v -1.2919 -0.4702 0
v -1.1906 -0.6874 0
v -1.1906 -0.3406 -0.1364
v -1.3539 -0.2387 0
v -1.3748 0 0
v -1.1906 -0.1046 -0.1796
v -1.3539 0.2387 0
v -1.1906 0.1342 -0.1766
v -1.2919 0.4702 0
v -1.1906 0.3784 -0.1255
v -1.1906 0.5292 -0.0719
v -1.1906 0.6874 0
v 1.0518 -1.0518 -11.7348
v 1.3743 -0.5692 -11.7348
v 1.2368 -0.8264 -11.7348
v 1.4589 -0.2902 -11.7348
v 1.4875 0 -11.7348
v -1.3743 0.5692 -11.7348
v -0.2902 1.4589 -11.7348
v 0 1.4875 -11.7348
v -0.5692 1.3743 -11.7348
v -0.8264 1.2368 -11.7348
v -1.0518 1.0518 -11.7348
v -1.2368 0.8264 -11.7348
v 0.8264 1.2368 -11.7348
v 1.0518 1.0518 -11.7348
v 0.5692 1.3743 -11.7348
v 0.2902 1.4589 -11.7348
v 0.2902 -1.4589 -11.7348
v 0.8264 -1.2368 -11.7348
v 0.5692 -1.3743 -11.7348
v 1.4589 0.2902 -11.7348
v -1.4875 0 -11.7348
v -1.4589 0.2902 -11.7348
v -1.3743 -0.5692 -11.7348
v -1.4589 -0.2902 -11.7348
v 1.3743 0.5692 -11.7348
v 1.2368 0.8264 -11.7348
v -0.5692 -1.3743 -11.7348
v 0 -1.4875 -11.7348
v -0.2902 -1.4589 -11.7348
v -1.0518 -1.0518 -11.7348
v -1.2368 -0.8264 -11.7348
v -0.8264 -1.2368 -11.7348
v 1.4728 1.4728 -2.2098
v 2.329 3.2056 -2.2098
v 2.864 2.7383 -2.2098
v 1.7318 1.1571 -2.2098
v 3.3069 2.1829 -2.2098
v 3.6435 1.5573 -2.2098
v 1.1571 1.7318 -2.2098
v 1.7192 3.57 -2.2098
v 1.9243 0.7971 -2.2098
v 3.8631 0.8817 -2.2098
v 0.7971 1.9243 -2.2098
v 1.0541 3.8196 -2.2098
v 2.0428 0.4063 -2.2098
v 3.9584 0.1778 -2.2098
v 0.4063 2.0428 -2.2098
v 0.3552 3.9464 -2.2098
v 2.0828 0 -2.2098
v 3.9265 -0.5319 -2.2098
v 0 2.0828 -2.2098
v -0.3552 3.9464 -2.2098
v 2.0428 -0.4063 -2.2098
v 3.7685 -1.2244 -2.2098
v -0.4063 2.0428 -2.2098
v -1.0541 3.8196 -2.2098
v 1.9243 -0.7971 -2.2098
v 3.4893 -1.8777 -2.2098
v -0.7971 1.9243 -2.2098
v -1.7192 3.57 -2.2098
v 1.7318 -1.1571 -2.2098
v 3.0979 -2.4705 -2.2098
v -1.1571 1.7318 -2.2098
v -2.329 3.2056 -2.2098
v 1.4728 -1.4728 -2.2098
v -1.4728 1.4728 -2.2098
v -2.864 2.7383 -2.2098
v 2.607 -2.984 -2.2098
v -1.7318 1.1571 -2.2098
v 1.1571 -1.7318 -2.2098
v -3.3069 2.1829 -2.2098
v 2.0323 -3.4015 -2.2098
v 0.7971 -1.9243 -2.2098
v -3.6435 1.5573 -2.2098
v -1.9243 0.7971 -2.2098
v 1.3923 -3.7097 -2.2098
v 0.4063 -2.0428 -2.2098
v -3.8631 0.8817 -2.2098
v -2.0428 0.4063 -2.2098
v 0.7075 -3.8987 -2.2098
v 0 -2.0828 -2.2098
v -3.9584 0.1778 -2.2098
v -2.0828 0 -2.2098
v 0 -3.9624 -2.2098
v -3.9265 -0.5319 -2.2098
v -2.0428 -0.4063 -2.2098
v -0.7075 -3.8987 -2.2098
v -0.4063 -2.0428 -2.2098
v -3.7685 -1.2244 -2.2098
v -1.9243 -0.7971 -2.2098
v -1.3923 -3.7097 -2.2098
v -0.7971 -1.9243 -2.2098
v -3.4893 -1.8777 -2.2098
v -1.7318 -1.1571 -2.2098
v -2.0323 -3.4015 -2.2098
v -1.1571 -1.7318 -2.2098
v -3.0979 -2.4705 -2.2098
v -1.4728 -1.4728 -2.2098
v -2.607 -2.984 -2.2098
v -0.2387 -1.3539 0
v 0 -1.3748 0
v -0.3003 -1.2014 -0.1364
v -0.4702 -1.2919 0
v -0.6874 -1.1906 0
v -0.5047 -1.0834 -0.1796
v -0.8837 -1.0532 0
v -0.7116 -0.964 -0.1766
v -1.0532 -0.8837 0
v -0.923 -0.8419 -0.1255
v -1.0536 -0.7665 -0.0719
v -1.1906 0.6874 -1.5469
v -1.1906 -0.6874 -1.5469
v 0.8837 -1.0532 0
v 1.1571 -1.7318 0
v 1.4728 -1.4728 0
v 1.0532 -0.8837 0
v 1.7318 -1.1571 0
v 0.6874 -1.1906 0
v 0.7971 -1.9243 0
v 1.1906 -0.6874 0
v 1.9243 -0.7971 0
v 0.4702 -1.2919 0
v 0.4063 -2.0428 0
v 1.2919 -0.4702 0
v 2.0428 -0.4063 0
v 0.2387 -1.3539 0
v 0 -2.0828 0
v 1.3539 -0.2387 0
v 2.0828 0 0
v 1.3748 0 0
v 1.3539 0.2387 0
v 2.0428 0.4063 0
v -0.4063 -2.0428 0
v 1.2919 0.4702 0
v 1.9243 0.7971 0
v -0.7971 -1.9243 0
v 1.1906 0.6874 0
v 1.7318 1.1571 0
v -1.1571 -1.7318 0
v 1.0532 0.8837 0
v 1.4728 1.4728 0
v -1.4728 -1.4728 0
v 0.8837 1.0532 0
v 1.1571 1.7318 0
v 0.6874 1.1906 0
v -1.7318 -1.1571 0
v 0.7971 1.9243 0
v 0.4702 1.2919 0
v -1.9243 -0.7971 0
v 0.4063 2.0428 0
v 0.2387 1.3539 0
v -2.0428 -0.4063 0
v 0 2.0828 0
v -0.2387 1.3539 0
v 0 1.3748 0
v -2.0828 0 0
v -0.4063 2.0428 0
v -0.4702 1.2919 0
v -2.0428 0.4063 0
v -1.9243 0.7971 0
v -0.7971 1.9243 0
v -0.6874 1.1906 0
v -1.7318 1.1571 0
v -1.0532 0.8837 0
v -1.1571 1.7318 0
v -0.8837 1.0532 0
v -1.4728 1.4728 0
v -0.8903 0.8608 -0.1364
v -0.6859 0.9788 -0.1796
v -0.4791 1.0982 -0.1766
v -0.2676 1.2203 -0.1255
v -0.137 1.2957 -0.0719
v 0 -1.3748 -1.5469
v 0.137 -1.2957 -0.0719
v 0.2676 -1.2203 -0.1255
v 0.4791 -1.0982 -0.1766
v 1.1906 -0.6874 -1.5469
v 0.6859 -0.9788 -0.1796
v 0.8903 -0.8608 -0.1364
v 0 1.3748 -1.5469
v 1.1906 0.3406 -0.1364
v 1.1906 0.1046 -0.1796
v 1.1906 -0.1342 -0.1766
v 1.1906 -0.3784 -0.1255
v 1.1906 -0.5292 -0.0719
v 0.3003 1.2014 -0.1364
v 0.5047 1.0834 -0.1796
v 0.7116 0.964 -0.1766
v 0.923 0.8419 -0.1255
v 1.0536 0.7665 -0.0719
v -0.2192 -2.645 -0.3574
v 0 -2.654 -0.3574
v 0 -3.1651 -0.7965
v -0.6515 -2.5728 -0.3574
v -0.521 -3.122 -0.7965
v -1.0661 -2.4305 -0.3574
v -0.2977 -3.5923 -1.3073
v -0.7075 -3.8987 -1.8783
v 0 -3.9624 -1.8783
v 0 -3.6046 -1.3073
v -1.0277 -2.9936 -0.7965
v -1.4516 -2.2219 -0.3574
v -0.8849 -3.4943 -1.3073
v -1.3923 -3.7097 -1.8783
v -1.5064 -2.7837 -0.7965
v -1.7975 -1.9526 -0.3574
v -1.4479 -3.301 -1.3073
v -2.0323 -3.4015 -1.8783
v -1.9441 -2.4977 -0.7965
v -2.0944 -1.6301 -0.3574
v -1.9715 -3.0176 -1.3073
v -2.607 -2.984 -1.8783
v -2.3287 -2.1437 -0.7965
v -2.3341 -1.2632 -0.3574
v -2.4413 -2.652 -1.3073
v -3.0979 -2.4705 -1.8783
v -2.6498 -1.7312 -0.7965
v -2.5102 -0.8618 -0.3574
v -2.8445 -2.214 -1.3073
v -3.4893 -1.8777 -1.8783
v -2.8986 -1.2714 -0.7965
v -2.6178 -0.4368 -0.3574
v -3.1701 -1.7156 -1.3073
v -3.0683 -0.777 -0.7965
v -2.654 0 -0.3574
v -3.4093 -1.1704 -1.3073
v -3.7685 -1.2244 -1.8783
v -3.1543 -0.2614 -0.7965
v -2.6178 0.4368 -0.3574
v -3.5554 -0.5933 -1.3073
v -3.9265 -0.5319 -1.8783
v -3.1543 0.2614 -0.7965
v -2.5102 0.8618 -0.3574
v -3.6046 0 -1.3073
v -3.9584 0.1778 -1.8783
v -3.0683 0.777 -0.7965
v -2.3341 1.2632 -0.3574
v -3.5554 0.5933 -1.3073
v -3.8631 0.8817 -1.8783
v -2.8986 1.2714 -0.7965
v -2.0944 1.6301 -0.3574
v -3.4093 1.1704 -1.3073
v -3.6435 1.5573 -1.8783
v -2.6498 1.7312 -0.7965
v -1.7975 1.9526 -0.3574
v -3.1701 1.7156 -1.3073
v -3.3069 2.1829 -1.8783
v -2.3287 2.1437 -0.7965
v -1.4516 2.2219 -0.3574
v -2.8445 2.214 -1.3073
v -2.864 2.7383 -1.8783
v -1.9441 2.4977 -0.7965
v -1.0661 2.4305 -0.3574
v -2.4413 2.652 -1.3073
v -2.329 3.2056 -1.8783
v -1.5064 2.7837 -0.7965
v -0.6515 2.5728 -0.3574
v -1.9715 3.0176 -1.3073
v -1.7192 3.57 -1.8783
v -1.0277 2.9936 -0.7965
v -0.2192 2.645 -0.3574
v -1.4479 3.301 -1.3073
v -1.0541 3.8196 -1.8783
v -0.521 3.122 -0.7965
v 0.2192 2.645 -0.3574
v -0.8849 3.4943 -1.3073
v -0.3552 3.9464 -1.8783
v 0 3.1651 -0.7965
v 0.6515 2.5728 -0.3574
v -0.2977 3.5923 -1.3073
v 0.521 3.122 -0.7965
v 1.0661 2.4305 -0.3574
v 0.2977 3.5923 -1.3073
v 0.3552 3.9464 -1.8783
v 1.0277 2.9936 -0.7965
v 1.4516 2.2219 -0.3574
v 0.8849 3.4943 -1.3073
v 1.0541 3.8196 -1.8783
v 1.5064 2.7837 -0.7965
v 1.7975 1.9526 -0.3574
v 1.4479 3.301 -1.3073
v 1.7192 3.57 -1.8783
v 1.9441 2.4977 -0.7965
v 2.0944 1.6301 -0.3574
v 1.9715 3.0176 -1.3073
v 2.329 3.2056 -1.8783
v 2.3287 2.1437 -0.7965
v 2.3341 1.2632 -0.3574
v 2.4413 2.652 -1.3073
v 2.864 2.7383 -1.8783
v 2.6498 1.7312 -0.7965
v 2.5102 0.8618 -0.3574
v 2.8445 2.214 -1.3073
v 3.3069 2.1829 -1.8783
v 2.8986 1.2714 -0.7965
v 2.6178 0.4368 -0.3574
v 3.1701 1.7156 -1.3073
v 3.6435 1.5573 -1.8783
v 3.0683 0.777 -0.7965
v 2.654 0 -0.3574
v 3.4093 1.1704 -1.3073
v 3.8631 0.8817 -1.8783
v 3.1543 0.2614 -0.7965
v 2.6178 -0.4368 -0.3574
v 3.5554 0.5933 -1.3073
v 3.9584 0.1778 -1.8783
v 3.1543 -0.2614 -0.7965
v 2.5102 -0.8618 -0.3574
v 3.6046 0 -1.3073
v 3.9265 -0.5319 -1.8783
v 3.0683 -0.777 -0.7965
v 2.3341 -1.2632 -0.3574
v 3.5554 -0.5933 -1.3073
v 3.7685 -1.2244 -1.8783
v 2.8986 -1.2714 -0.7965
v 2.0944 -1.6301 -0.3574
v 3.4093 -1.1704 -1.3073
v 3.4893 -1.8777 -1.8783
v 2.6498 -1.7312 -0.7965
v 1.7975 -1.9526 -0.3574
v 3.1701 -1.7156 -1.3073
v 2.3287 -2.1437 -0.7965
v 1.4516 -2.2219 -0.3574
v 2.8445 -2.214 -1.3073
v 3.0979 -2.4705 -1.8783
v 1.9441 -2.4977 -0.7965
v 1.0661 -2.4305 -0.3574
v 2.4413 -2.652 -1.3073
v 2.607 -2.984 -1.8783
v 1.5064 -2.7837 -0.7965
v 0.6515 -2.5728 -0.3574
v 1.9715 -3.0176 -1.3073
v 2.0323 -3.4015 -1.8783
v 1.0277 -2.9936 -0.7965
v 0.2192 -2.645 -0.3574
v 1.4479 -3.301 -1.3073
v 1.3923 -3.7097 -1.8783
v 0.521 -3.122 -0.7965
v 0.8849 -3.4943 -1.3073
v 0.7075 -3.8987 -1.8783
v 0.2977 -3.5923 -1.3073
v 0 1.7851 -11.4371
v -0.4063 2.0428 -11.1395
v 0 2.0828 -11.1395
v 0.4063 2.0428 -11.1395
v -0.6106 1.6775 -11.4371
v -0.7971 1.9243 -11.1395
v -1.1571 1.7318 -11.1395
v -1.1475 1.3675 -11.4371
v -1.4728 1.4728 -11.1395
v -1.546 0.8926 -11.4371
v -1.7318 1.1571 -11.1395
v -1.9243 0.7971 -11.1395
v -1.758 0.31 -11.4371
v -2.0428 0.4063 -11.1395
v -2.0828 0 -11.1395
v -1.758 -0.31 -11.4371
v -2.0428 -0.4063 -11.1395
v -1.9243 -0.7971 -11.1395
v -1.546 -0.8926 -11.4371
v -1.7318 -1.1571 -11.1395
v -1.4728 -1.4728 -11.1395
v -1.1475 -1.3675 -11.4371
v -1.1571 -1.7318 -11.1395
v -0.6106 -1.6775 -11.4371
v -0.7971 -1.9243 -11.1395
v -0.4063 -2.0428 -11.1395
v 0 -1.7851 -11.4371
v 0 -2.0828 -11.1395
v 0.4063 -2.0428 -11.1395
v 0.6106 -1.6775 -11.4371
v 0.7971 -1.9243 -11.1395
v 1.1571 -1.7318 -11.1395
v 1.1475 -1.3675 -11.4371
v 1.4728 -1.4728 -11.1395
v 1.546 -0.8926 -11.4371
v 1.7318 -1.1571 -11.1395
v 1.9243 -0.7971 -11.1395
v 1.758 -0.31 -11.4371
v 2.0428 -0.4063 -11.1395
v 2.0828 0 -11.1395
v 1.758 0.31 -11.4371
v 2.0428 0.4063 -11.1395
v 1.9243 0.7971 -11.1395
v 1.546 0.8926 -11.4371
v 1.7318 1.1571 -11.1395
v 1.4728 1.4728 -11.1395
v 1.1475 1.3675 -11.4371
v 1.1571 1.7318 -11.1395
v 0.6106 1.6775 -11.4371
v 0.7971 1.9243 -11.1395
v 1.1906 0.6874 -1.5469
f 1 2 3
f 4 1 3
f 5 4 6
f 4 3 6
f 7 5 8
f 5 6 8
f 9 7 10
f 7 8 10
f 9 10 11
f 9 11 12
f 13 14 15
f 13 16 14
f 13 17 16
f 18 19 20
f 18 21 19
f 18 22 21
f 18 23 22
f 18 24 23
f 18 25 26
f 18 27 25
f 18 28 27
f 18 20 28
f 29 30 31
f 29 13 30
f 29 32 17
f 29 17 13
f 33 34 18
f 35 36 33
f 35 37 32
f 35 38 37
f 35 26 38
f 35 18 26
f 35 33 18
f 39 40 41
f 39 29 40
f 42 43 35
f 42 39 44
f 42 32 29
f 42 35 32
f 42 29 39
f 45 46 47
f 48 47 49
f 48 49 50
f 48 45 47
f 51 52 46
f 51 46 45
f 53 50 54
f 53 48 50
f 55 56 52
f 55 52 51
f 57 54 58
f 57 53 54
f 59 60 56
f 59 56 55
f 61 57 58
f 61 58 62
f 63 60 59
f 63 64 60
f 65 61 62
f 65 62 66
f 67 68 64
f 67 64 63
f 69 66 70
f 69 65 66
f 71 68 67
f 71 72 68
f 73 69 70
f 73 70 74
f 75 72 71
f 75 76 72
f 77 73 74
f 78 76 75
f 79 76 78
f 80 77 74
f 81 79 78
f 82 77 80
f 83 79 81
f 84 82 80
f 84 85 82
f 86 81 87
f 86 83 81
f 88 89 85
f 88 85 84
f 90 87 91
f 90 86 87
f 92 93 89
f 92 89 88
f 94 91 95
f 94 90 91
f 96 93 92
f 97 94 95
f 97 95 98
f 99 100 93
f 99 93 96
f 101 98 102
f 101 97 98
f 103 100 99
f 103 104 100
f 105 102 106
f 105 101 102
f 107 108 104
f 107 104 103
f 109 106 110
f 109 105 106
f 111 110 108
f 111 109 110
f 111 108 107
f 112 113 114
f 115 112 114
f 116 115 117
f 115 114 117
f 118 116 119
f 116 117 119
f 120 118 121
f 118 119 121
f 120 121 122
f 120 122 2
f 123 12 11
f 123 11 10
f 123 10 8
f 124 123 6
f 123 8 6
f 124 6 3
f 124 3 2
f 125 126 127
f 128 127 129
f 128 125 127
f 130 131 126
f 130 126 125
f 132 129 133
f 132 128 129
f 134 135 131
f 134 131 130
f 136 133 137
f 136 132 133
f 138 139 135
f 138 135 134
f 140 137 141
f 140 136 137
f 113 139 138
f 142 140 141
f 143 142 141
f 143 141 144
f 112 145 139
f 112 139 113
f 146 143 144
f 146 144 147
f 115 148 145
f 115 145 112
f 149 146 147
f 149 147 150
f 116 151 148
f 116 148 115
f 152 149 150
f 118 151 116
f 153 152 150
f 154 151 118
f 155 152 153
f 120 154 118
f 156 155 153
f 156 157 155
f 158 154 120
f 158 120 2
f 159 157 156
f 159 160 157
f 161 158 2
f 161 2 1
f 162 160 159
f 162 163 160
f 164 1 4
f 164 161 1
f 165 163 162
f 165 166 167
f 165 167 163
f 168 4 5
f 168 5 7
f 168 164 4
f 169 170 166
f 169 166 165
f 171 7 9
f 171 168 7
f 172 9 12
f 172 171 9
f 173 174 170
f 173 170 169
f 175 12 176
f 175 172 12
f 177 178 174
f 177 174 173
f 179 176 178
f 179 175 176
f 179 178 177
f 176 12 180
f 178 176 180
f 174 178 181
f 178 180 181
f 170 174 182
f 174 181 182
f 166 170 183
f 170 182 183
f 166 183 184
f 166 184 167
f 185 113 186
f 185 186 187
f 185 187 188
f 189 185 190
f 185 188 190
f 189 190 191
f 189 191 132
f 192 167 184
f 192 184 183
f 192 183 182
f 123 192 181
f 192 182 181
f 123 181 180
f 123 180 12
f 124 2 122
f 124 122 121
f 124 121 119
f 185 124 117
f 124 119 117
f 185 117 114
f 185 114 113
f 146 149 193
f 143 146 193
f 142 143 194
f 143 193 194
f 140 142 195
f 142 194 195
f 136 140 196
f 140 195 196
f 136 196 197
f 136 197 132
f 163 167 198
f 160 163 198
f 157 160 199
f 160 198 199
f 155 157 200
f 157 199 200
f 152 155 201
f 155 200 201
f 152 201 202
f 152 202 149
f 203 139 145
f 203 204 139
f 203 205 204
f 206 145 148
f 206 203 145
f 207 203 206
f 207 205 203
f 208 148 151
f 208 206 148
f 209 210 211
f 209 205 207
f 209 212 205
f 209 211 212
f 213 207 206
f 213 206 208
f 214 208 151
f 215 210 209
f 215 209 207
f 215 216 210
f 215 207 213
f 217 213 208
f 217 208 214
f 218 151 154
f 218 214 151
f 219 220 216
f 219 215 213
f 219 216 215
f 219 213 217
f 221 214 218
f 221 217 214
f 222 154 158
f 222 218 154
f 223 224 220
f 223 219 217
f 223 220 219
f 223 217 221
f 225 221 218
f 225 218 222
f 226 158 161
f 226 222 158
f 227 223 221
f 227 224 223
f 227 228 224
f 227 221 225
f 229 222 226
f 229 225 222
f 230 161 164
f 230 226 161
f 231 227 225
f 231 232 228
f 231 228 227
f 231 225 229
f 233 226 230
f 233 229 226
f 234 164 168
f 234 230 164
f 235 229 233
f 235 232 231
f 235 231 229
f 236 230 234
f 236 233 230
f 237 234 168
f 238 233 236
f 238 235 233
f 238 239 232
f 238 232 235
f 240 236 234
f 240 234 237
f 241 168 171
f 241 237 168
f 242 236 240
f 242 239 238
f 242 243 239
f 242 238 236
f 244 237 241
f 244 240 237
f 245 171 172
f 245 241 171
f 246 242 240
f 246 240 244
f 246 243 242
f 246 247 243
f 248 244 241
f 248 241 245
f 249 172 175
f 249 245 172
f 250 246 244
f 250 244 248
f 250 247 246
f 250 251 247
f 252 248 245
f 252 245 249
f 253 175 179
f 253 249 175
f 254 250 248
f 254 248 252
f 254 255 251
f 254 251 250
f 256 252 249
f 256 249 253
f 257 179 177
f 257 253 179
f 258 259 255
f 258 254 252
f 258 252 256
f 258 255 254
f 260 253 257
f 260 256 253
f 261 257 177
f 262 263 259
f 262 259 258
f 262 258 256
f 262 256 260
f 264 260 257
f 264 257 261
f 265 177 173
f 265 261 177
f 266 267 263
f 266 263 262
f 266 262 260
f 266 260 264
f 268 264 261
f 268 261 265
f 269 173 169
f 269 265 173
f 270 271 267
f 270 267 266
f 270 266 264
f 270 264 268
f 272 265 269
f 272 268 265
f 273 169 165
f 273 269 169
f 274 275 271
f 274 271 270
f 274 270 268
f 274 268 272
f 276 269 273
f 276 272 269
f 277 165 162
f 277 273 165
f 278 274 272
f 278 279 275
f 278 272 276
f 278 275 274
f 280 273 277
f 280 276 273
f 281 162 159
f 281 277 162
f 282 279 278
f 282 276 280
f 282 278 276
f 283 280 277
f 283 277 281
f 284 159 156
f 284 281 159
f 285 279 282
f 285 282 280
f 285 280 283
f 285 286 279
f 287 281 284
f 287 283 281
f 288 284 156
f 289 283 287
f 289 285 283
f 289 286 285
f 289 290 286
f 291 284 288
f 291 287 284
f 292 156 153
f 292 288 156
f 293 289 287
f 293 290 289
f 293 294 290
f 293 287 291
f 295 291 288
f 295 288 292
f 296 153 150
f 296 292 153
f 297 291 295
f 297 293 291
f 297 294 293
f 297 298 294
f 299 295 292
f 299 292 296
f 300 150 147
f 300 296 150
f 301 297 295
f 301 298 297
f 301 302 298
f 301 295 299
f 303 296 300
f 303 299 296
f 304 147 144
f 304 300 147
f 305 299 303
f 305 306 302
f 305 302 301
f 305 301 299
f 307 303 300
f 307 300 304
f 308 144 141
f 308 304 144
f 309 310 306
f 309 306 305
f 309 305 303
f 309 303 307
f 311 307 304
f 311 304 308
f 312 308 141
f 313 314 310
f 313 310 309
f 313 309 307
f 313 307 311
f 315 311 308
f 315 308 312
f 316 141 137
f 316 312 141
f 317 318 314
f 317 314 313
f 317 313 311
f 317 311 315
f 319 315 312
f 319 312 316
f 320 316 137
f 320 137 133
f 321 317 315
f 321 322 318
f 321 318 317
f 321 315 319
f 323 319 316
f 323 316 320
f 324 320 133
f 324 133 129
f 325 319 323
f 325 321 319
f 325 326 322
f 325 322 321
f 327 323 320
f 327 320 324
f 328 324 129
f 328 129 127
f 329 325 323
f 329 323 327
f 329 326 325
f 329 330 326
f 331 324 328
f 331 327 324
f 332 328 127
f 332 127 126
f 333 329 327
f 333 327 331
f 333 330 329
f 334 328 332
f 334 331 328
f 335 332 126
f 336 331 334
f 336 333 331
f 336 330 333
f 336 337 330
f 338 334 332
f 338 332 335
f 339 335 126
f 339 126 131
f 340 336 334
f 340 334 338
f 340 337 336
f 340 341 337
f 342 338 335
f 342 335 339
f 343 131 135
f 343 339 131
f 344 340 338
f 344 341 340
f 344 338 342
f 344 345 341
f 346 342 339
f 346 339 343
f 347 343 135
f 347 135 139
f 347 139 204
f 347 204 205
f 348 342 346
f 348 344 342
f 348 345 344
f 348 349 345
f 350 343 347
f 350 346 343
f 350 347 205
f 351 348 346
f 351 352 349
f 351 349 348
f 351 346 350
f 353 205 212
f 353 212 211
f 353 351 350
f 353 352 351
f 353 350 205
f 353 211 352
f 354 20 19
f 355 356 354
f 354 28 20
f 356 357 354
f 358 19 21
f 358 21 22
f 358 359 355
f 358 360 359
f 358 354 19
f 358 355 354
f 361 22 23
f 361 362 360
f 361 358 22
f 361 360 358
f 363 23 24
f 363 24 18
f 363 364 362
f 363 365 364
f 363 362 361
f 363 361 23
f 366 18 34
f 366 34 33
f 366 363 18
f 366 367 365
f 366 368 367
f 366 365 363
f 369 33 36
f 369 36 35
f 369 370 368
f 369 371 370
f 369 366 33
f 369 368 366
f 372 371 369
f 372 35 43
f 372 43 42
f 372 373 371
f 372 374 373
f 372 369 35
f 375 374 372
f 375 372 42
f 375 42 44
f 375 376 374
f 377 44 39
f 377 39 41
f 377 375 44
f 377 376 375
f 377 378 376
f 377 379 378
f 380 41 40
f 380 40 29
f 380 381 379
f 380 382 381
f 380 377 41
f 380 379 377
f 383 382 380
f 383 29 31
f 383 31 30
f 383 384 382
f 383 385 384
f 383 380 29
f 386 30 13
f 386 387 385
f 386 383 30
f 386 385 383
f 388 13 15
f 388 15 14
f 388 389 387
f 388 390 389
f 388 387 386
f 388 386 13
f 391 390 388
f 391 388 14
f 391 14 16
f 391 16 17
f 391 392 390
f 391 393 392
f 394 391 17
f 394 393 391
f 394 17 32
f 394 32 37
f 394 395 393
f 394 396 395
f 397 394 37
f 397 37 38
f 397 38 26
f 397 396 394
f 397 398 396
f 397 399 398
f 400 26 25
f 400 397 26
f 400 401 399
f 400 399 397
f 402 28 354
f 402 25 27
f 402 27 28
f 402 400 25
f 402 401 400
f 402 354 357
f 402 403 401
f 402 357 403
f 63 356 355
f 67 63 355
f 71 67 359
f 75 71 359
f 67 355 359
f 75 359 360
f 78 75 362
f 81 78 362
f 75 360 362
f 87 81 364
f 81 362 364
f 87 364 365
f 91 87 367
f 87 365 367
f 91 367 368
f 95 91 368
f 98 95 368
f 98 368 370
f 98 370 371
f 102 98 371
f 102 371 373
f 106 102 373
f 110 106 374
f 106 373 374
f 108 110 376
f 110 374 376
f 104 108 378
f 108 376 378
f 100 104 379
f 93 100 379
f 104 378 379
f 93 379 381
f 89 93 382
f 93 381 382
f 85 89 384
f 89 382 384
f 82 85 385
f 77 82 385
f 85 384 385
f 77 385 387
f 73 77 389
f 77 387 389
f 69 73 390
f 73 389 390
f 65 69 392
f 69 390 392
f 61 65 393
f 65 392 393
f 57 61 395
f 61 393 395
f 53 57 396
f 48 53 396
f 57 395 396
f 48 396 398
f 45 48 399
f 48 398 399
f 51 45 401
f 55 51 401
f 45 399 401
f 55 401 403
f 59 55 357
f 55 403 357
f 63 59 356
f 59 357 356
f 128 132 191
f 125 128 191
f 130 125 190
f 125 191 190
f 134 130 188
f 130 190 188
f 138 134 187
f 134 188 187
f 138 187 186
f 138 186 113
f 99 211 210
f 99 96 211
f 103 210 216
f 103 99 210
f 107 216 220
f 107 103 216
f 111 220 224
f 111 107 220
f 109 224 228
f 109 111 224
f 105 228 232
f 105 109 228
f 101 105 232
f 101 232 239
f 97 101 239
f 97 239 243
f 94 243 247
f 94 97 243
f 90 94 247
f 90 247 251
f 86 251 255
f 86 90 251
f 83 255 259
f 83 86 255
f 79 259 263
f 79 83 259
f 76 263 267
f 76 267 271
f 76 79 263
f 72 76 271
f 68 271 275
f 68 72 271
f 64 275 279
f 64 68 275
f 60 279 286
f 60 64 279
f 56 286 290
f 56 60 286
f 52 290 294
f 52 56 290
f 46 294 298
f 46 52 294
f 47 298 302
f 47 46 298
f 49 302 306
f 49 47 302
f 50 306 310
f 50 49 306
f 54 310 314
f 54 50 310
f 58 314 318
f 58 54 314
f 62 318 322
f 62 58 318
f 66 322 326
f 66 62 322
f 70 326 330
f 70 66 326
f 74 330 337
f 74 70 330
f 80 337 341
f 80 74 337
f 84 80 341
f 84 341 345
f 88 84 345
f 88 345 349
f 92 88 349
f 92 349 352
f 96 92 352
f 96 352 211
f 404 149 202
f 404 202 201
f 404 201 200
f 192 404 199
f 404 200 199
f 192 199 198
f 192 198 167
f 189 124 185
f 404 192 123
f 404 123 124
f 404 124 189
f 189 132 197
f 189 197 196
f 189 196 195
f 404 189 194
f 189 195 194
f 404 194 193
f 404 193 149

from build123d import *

# Parameters (mm, degrees)
SKETCH1_W          = 9.525
SKETCH1_H          = 2.0828
CHAMFER1_SIZE      = 0.5953125
CUT_EXTRUDE2_DEPTH = 1.54686


with BuildPart() as part:
    # Sketch1 → Revolve1 (revolve)
    with BuildSketch(Plane(origin=(0, 0, 0), x_dir=(0, 0, -1), z_dir=(1, 0, 0))):
        with Locations((6.9723, 1.0414)):
            Rectangle(SKETCH1_W, SKETCH1_H)
    revolve(axis=Axis((0, 0, -11.7348), (0, 0, 1)))

    # Chamfer1
    chamfer1_edges = [part.edges().sort_by_distance(p)[0] for p in [
        (0, -2.0828, -11.7348),
    ]]
    chamfer(chamfer1_edges, length=CHAMFER1_SIZE)

    # Sketch7 → Revolve2 (revolve)
    with BuildSketch(Plane(origin=(0, 0, 0), x_dir=(0, 0, -1), z_dir=(1, 0, 0))):
        with BuildLine():
            Line((1.87833, 3.9624), (2.2098, 3.9624))
            Line((2.2098, 3.9624), (2.2098, 0))
            Line((2.2098, 0), (0, 0))
            Line((0, 0), (0, 2.0828))
            ThreePointArc((0, 2.0828), (0.796523813, 3.165144808), (1.87833, 3.9624))
        make_face()
    revolve(axis=Axis((0, 0, 0), (0, 0, -1)))

    # Sketch5 → Cut-Extrude2 (cut)
    with BuildSketch(Plane.XY):
        Polygon((1.190625, -0.687407664), (1.190625, 0.687407664), (0, 1.374815329), (-1.190625, 0.687407664), (-1.190625, -0.687407664), (0, -1.374815329), align=None)
    extrude(amount=-CUT_EXTRUDE2_DEPTH, mode=Mode.SUBTRACT)

    # Cut-Extrude3 cone 1 section (through the dimple's axis) → Cut-Extrude3 (revolve, cut)
    with BuildSketch(Plane(origin=(0, 0, 0), x_dir=(0, -1, 0), z_dir=(1, 0, 0))):
        Polygon((0, 0), (1.374815329, 0), (0, 1.374815329), align=None)
    revolve(axis=Axis((0, 0, 0), (0, 0, -1)), mode=Mode.SUBTRACT)


solid = part.part
